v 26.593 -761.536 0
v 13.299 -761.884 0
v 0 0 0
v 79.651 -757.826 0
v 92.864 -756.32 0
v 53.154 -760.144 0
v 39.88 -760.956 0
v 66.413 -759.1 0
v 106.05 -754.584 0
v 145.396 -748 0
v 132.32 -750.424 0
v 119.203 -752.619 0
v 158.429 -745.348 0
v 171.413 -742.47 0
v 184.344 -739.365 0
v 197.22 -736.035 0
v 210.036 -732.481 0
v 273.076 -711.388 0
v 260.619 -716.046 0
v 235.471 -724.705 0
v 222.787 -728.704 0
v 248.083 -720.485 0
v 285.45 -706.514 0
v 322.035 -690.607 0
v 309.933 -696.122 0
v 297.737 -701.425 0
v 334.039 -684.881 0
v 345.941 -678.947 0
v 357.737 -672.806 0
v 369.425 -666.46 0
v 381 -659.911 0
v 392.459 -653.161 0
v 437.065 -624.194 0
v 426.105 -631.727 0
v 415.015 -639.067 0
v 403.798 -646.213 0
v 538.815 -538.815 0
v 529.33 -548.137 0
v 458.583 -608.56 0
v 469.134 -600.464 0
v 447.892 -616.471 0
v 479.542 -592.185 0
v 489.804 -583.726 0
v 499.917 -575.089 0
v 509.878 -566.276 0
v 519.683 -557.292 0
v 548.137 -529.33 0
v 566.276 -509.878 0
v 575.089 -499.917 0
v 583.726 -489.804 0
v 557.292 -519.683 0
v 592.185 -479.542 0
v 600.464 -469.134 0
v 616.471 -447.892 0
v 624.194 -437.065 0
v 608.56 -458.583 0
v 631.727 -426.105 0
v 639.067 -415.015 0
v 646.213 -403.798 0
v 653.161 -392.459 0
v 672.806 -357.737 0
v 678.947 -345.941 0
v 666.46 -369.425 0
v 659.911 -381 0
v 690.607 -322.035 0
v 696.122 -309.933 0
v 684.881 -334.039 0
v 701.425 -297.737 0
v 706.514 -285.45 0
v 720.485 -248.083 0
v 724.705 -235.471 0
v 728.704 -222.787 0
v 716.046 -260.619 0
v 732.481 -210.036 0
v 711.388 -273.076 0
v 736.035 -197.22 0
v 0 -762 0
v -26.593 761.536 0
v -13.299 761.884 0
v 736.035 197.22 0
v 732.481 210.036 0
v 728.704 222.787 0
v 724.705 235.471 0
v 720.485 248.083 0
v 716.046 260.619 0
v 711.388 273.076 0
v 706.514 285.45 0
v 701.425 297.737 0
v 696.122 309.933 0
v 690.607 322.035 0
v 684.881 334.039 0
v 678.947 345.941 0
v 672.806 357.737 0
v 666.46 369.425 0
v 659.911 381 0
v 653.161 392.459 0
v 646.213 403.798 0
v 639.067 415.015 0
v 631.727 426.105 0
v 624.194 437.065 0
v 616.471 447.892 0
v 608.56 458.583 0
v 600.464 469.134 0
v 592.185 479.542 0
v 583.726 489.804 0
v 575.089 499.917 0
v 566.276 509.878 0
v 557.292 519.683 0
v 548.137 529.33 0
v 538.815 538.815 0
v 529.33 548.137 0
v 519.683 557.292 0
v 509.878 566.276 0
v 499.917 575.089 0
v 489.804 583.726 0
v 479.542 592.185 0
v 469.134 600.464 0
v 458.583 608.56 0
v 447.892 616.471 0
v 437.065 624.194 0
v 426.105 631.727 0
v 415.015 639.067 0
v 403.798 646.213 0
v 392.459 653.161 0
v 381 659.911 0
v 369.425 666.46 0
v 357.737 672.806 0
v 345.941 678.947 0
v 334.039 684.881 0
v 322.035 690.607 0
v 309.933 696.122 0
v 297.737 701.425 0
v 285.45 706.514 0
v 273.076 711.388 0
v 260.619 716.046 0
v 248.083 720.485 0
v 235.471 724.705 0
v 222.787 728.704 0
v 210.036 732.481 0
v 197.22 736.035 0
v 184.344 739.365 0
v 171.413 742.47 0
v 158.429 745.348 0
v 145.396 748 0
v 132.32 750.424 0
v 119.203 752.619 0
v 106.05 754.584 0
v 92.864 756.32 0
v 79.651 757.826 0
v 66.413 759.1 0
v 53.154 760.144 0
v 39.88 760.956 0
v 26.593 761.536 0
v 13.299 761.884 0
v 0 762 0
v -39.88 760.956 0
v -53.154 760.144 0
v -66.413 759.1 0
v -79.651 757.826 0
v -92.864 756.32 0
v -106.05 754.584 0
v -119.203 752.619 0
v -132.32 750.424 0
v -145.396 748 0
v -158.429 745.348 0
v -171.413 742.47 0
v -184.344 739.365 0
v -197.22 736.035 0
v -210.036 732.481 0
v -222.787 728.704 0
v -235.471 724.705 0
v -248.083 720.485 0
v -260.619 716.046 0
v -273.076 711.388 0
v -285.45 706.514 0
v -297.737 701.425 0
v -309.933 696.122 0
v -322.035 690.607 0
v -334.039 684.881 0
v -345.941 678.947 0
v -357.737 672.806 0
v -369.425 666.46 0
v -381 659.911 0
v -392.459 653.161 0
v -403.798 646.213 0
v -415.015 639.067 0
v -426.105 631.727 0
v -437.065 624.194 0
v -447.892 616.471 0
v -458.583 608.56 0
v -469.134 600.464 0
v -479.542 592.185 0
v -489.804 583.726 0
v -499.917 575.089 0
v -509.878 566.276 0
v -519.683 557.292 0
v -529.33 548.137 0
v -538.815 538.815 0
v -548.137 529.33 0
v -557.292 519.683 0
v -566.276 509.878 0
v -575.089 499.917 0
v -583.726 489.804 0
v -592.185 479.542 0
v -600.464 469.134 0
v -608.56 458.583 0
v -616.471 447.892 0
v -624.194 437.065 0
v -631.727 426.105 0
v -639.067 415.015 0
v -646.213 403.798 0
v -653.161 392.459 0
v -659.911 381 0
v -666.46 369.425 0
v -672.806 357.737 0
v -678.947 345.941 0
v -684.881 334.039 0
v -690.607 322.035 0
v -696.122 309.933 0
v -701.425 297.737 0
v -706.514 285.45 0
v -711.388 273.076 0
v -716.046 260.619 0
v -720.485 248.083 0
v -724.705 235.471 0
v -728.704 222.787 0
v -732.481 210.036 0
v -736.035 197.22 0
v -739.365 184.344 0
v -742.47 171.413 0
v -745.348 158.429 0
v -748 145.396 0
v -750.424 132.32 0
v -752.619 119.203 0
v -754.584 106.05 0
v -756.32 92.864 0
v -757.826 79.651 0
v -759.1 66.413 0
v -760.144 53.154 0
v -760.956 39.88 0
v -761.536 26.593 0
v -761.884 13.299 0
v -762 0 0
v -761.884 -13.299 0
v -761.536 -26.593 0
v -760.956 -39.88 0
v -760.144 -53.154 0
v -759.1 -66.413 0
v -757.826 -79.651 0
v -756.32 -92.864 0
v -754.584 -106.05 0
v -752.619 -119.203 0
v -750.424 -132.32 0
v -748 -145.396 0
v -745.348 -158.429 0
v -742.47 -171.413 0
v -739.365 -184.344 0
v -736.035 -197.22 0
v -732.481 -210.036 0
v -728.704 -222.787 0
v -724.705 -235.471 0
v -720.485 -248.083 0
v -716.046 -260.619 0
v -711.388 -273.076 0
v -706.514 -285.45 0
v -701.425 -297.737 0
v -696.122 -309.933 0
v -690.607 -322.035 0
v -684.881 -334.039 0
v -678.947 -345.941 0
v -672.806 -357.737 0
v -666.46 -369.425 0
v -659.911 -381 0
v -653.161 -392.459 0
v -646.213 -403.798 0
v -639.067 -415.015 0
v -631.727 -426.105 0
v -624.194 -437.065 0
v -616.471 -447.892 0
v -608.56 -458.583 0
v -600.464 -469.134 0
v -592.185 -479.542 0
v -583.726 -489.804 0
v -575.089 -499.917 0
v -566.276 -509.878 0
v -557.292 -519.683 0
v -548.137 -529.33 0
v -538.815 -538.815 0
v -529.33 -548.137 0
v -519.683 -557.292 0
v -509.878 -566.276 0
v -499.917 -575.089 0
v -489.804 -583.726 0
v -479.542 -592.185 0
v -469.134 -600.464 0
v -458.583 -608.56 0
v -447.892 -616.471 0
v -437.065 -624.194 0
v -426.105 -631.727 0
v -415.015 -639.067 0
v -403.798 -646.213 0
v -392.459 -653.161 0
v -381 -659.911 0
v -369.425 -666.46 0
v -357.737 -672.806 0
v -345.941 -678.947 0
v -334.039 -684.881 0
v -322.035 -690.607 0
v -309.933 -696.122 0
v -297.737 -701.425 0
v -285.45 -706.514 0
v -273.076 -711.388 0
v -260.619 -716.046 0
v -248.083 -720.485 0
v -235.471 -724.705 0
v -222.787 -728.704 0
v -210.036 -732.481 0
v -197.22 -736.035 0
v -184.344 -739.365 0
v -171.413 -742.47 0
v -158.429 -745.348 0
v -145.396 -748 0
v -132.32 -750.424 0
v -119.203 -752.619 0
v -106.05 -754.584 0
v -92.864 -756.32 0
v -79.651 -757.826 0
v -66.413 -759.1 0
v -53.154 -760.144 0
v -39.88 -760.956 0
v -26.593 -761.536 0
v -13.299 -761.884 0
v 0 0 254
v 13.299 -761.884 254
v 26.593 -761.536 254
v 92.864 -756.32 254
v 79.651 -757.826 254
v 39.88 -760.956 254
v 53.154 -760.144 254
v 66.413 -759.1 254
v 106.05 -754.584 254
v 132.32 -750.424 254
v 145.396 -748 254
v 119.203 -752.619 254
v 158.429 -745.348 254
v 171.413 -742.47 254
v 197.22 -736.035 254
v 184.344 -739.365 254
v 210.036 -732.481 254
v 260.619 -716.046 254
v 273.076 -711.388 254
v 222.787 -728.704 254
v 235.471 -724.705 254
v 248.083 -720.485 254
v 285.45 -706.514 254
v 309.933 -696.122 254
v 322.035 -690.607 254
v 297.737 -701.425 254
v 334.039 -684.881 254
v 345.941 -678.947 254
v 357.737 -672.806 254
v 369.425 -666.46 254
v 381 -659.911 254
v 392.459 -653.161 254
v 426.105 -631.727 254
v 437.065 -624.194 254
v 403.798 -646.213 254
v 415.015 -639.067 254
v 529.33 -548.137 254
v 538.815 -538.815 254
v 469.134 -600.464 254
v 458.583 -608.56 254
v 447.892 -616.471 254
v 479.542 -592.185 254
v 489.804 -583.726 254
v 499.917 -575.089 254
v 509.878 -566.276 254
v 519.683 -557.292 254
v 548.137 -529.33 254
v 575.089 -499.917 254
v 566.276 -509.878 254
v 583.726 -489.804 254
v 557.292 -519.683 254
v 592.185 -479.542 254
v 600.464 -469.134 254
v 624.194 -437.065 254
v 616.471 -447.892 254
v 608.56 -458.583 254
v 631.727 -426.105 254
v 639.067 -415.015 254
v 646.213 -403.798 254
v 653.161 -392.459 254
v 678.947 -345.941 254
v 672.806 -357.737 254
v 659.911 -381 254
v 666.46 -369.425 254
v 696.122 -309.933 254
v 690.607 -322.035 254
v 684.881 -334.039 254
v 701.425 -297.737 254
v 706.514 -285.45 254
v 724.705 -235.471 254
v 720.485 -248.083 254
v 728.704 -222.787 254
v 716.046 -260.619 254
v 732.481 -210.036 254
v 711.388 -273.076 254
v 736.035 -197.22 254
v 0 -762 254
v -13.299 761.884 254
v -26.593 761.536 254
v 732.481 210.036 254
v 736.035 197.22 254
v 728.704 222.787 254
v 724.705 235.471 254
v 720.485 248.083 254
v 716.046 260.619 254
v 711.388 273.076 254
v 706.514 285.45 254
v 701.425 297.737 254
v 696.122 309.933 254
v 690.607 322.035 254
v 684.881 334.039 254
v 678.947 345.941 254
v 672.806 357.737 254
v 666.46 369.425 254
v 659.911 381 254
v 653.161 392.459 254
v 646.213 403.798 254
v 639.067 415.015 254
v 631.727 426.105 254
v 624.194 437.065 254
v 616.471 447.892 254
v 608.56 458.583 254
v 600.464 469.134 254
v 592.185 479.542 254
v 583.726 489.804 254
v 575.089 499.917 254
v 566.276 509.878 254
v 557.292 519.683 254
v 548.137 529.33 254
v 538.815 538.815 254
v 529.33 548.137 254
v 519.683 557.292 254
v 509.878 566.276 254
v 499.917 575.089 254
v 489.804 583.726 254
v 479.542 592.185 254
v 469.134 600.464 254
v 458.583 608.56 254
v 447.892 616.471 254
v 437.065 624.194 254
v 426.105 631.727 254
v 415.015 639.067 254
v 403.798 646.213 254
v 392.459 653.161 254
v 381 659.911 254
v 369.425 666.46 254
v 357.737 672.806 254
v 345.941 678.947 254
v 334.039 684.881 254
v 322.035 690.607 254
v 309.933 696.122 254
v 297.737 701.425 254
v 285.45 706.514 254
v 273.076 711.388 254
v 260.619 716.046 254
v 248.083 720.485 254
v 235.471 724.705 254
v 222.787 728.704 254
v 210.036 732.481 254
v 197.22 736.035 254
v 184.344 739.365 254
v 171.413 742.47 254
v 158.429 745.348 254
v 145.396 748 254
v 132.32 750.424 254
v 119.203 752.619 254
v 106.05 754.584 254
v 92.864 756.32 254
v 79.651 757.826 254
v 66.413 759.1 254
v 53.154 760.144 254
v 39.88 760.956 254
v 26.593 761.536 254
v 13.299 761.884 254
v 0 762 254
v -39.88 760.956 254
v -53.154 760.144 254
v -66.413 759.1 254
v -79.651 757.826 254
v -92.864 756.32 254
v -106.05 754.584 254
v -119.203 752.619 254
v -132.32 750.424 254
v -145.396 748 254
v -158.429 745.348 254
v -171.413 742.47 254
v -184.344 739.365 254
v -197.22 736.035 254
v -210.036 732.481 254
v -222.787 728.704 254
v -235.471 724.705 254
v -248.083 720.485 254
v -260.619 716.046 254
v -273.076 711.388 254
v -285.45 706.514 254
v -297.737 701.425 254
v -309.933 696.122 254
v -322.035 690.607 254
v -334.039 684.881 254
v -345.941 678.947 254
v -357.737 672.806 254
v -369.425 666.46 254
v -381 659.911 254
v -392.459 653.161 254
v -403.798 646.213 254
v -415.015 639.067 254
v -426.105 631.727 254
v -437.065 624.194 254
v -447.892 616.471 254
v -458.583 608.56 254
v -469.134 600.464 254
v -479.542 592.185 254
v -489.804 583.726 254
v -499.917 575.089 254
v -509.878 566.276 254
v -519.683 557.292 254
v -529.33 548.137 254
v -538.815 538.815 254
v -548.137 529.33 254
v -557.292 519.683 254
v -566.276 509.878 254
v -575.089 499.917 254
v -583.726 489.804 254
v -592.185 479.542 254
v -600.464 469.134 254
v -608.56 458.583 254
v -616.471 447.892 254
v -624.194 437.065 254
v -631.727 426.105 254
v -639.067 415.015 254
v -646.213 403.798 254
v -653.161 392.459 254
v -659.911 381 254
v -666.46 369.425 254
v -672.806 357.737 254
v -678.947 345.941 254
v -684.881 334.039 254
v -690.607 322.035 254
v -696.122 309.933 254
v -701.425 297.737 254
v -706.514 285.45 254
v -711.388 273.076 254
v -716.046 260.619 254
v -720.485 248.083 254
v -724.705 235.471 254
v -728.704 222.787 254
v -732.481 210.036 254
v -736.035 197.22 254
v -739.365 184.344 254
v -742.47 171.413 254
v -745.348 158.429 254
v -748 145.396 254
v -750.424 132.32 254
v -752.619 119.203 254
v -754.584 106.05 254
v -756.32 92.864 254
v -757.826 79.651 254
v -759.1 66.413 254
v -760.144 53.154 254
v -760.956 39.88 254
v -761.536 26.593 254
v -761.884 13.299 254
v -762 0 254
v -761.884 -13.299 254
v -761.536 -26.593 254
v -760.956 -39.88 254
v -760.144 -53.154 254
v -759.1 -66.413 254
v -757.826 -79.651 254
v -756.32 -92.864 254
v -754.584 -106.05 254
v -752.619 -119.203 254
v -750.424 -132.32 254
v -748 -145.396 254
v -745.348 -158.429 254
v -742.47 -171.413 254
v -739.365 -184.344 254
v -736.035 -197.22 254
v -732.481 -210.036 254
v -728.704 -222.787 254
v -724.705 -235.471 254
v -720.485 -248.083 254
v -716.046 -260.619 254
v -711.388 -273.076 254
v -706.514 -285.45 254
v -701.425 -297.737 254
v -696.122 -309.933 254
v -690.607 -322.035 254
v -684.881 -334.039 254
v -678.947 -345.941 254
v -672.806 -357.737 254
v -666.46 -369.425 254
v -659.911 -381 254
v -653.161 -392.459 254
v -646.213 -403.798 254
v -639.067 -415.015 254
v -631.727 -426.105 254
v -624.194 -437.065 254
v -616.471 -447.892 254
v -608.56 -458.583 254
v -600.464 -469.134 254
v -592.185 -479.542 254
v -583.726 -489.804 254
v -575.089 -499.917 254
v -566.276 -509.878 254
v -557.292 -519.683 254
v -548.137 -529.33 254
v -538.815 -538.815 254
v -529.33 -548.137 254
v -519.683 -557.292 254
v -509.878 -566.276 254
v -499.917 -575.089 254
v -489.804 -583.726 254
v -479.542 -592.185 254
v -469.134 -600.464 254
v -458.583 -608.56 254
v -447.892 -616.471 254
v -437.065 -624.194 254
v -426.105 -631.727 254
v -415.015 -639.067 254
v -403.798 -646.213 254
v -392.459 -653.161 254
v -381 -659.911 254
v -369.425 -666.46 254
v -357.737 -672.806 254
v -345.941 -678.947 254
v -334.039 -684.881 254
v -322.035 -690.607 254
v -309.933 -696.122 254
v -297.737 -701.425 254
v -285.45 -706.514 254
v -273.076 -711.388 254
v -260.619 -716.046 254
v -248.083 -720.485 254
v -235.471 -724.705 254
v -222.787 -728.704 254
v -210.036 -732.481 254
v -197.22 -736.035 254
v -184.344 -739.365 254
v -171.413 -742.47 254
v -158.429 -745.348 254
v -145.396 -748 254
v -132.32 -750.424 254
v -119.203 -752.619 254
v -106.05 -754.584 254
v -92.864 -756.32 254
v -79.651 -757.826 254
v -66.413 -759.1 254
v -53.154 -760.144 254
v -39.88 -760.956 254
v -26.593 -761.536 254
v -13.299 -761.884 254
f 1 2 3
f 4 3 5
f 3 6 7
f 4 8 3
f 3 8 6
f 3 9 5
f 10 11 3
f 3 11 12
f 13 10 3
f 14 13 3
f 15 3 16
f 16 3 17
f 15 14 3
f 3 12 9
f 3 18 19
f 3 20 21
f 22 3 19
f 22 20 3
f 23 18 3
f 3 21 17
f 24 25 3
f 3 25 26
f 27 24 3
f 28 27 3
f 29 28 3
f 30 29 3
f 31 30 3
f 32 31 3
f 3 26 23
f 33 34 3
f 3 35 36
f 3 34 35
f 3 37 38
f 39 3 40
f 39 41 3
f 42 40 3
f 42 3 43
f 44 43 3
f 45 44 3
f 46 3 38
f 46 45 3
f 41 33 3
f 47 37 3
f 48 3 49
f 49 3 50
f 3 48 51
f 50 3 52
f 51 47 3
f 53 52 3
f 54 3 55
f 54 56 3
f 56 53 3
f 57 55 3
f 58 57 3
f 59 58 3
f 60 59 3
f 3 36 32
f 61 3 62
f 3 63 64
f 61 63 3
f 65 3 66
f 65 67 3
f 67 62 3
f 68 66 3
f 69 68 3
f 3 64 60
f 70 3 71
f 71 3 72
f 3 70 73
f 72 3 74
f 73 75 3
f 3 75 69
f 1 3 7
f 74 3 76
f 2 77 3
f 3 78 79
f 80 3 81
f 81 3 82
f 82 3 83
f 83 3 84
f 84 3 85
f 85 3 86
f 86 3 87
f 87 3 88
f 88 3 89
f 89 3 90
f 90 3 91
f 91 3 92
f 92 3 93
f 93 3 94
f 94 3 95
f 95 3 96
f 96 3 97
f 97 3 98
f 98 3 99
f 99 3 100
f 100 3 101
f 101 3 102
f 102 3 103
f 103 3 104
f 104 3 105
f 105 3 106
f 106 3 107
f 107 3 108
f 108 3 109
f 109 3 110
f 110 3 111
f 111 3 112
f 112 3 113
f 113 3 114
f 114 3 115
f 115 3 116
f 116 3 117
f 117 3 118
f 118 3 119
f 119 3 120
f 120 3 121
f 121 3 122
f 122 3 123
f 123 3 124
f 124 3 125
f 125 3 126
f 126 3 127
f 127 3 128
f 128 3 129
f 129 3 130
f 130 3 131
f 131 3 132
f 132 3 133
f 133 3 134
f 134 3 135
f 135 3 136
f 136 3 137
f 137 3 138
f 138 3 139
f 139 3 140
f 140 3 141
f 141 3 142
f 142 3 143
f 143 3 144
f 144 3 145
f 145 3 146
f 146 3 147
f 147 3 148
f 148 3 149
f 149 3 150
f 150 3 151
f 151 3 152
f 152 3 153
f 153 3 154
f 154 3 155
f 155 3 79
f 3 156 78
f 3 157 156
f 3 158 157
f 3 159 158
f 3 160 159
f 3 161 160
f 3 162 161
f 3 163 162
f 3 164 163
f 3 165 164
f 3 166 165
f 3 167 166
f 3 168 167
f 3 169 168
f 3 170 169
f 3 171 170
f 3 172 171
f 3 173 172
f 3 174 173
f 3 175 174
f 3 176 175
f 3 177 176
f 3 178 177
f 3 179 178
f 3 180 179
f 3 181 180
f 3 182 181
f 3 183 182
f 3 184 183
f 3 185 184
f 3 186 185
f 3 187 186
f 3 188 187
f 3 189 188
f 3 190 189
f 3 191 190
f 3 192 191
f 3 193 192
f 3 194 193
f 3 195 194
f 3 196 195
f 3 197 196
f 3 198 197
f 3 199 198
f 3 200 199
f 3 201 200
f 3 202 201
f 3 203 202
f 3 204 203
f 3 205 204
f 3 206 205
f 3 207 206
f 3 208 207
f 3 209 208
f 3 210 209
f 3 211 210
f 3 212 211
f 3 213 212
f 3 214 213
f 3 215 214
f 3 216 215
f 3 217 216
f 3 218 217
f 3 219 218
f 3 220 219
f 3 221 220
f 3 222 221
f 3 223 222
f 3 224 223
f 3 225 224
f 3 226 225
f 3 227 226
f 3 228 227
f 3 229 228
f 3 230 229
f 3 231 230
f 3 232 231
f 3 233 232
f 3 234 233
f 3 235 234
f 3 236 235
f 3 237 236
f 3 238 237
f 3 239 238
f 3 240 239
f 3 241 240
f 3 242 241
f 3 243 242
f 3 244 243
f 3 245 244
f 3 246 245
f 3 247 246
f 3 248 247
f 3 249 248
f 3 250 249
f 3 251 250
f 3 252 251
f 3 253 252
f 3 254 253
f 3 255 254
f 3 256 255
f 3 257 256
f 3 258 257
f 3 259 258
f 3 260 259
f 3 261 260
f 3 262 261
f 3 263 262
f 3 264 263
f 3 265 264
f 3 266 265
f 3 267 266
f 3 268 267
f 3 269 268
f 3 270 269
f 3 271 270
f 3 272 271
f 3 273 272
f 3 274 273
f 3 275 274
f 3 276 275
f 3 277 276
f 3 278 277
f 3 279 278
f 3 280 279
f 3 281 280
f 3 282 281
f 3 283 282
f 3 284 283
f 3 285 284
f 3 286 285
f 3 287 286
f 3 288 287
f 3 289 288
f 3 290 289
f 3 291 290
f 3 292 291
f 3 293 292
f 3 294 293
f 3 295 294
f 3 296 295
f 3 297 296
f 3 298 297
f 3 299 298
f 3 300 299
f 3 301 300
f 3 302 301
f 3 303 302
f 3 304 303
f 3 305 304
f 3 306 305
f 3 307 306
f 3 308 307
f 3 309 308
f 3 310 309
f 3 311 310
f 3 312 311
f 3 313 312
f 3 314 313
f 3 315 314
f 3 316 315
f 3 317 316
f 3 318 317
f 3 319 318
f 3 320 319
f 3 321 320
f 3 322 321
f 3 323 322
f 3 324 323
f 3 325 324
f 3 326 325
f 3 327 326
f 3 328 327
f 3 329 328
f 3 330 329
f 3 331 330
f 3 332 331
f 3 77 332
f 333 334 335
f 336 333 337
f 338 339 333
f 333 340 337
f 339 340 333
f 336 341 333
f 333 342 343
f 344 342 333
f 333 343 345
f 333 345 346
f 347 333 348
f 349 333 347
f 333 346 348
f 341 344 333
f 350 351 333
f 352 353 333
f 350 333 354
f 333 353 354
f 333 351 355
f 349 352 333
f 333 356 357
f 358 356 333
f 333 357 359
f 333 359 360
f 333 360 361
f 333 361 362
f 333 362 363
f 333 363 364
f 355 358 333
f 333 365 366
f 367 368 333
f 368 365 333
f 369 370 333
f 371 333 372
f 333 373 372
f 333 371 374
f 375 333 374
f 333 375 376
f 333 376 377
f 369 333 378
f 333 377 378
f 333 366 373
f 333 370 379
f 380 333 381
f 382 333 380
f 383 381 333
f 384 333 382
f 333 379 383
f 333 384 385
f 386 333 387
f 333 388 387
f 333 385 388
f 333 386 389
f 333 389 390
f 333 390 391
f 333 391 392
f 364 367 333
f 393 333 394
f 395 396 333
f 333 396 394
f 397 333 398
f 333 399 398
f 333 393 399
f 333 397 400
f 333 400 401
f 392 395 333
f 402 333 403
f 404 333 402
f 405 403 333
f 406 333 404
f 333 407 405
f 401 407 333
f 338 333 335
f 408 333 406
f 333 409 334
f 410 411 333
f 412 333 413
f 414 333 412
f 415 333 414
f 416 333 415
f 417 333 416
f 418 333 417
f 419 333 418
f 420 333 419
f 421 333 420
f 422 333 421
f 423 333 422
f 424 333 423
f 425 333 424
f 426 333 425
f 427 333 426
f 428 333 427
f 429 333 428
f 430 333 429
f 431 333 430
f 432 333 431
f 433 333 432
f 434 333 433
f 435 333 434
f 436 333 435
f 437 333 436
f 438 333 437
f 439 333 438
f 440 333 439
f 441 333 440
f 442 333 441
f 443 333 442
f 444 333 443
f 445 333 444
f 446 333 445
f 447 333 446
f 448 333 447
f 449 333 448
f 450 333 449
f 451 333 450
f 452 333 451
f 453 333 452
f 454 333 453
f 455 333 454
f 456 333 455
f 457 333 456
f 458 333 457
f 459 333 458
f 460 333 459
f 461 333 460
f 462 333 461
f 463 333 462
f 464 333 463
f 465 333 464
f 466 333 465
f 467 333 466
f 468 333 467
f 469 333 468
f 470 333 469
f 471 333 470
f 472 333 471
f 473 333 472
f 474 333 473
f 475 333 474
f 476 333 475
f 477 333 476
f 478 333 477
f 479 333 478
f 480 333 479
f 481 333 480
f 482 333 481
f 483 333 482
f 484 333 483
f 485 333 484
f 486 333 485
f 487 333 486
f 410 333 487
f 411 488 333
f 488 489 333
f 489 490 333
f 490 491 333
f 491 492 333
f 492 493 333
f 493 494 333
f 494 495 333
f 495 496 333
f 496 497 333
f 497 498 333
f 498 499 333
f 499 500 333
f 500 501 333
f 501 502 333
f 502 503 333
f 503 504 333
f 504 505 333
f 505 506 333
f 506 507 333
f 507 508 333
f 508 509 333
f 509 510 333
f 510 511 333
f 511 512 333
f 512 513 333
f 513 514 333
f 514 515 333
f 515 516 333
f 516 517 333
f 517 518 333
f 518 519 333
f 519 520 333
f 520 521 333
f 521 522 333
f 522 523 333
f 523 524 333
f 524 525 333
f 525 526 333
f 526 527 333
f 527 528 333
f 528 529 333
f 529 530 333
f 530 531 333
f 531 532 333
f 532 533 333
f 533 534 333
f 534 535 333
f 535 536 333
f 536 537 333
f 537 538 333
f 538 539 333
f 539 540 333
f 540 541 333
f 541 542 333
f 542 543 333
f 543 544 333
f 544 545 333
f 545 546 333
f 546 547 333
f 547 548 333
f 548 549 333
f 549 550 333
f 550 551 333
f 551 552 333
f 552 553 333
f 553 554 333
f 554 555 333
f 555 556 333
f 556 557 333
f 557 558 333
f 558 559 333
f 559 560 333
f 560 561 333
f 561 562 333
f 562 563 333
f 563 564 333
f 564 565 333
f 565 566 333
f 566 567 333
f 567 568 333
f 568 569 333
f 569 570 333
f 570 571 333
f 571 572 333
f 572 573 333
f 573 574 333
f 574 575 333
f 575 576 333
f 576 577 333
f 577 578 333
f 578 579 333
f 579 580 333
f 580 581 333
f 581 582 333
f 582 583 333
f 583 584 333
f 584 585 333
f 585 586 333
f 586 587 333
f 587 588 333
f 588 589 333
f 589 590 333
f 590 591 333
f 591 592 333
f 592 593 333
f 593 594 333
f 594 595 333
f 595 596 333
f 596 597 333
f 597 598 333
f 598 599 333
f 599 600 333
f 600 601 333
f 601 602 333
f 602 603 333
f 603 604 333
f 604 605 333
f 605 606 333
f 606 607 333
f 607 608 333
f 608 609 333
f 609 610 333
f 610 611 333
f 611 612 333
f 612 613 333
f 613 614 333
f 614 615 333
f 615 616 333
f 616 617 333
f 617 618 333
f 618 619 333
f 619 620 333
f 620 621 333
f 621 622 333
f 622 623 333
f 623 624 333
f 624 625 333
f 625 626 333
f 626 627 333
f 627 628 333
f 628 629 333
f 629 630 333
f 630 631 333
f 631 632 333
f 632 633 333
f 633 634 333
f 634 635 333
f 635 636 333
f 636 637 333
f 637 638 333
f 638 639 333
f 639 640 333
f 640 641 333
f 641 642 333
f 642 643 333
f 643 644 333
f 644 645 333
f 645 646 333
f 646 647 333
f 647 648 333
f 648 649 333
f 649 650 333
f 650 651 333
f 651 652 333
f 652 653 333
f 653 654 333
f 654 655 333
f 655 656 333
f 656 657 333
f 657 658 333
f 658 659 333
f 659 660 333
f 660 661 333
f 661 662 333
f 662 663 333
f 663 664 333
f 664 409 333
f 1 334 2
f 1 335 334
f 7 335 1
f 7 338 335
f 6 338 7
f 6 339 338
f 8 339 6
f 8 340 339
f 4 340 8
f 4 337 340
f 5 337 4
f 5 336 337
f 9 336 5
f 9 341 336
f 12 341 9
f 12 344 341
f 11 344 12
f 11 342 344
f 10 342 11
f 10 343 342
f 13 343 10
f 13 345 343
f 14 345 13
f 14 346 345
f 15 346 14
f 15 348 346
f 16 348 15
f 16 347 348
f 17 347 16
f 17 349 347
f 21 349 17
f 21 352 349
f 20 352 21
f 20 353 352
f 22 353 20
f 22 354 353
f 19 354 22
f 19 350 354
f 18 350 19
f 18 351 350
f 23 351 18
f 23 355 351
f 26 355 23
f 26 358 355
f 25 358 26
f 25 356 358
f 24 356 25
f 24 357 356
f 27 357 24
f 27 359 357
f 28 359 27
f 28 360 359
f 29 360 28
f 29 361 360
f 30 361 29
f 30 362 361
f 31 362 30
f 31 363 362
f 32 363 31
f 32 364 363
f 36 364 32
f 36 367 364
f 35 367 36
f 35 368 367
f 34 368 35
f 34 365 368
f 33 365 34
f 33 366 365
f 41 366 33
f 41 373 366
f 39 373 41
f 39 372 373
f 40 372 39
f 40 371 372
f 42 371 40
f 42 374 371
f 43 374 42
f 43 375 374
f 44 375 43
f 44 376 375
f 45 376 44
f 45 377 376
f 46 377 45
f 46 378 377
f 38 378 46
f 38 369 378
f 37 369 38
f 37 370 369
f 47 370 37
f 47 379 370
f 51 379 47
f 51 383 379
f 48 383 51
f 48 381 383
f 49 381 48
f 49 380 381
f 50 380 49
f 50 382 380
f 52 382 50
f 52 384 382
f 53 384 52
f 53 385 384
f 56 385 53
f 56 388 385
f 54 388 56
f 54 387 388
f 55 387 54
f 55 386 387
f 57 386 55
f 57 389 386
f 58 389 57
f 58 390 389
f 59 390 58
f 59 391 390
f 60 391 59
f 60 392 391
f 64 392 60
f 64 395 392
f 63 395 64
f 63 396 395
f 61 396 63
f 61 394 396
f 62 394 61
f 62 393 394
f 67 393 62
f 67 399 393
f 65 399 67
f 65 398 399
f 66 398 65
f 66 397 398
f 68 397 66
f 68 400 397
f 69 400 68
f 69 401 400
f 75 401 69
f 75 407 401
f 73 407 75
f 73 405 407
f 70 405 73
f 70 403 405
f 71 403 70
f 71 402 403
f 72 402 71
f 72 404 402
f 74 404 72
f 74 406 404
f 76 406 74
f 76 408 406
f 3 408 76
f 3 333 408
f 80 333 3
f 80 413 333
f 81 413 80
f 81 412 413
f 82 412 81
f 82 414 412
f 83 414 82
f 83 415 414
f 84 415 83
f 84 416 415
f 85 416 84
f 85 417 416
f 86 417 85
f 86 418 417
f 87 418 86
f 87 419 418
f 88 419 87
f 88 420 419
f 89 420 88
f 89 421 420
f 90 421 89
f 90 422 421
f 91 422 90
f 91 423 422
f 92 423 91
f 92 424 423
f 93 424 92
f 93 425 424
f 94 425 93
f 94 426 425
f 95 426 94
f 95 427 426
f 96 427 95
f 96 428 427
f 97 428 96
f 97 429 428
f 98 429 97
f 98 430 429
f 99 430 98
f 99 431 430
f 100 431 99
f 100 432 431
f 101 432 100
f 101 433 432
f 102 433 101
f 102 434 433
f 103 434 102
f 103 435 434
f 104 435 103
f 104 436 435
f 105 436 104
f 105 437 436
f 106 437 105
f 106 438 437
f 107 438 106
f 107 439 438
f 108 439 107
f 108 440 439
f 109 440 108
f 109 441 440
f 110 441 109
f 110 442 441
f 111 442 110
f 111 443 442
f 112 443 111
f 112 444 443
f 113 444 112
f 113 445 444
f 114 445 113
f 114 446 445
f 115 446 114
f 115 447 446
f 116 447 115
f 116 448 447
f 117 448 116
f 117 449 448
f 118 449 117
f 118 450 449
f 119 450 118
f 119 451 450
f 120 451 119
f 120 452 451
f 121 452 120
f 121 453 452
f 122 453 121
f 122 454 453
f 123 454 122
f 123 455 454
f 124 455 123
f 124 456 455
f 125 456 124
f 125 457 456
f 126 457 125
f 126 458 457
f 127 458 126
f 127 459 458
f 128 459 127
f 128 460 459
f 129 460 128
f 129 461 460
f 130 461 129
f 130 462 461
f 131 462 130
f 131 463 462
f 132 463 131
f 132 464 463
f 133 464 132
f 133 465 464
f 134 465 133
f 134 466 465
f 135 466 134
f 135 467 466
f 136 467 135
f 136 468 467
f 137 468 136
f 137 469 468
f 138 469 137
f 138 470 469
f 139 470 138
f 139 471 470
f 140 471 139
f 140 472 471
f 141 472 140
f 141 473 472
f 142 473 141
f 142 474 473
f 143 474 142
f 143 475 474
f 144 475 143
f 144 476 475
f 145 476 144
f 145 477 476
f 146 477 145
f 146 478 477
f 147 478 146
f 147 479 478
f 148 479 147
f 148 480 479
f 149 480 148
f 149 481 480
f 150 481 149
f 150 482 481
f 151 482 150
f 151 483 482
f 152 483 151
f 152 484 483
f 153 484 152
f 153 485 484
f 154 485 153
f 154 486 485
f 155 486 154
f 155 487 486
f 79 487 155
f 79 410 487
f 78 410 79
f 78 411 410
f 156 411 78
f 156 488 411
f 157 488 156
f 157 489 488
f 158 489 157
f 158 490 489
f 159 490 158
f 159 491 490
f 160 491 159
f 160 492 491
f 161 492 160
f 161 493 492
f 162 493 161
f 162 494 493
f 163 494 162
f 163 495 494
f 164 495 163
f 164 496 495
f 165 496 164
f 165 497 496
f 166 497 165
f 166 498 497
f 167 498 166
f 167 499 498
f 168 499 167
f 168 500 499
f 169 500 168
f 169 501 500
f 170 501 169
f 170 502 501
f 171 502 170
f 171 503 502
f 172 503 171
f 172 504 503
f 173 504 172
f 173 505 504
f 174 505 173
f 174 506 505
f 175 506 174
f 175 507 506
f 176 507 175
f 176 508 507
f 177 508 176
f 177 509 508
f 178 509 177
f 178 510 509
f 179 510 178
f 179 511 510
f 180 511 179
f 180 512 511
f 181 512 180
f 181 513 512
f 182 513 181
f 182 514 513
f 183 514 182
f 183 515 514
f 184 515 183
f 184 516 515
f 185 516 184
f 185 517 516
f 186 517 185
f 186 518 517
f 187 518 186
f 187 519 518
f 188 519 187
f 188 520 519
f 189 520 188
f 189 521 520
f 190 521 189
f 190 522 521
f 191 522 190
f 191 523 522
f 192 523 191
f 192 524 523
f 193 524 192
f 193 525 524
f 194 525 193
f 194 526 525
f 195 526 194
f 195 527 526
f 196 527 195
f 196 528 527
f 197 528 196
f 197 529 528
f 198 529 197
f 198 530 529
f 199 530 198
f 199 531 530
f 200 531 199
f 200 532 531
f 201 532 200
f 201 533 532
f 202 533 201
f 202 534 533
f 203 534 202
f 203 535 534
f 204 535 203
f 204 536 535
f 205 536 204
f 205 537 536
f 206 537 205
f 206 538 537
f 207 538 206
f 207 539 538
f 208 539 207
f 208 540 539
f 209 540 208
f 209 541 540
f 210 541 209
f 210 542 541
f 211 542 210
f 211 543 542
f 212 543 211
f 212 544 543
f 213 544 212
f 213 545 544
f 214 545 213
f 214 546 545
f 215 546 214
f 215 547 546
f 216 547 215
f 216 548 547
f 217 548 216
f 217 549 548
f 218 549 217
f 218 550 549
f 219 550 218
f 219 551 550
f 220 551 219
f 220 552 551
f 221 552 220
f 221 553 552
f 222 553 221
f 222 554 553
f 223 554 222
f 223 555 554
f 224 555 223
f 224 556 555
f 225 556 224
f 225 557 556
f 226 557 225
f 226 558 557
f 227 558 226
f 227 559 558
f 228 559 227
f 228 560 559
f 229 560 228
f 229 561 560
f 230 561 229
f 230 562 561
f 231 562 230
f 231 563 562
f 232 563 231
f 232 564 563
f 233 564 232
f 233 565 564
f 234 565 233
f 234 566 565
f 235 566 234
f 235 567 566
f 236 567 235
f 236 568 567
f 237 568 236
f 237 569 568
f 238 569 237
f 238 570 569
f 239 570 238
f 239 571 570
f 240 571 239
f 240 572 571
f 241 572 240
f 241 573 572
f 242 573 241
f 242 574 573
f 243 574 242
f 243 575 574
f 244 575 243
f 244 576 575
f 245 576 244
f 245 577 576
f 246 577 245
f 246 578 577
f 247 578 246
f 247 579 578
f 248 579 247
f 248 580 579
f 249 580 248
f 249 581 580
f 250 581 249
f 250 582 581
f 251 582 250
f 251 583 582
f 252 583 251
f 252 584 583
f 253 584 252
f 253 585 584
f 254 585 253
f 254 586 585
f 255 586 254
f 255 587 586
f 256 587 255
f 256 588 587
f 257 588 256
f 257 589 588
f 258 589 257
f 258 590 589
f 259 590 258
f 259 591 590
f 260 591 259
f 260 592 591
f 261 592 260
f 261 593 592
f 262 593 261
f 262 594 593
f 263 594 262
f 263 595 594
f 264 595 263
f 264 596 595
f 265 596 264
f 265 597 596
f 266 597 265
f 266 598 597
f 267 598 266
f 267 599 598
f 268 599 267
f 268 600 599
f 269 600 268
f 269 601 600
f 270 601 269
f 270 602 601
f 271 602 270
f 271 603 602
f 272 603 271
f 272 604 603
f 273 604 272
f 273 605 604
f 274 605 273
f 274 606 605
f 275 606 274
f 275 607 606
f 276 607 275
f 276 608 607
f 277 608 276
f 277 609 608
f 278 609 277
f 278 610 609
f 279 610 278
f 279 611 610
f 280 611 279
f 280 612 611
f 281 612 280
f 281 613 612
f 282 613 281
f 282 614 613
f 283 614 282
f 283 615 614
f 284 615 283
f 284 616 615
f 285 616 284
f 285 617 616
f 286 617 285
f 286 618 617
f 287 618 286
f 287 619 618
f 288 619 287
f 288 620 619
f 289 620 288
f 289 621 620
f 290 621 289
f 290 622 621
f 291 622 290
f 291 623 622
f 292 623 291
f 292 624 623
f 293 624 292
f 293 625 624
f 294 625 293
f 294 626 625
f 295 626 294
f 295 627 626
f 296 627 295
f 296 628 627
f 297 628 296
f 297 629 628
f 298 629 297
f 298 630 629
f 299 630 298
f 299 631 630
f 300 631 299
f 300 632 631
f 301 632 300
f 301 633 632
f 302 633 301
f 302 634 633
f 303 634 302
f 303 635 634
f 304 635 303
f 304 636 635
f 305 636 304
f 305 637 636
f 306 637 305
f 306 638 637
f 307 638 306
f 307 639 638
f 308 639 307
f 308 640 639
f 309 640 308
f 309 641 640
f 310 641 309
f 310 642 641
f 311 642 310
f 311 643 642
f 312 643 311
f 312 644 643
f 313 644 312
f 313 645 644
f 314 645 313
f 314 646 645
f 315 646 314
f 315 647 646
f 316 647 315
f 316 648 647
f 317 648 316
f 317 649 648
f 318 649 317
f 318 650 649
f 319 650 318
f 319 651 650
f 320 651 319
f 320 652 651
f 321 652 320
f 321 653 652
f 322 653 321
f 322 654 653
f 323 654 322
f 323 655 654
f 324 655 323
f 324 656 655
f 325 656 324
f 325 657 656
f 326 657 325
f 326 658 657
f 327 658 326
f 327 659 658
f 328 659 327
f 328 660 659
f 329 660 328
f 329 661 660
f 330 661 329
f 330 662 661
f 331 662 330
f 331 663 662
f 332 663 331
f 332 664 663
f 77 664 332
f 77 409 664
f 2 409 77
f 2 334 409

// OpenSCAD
// Unit of length: Unit.MM
linear_extrude(height = 254.0, center = false, convexity = 2, twist = 0.0, scale = 1.0)
{
   intersection()
   {
      circle(d = 1524.0, $fn = 360);
      polygon(points = [[0.0, 0.0], [850.1839, 227.8061], [0.0, 1077.9899], [-1077.9899, 0.0], [0.0, -1077.9899], [850.1839, -227.8061]], convexity = 2);
   }
}
